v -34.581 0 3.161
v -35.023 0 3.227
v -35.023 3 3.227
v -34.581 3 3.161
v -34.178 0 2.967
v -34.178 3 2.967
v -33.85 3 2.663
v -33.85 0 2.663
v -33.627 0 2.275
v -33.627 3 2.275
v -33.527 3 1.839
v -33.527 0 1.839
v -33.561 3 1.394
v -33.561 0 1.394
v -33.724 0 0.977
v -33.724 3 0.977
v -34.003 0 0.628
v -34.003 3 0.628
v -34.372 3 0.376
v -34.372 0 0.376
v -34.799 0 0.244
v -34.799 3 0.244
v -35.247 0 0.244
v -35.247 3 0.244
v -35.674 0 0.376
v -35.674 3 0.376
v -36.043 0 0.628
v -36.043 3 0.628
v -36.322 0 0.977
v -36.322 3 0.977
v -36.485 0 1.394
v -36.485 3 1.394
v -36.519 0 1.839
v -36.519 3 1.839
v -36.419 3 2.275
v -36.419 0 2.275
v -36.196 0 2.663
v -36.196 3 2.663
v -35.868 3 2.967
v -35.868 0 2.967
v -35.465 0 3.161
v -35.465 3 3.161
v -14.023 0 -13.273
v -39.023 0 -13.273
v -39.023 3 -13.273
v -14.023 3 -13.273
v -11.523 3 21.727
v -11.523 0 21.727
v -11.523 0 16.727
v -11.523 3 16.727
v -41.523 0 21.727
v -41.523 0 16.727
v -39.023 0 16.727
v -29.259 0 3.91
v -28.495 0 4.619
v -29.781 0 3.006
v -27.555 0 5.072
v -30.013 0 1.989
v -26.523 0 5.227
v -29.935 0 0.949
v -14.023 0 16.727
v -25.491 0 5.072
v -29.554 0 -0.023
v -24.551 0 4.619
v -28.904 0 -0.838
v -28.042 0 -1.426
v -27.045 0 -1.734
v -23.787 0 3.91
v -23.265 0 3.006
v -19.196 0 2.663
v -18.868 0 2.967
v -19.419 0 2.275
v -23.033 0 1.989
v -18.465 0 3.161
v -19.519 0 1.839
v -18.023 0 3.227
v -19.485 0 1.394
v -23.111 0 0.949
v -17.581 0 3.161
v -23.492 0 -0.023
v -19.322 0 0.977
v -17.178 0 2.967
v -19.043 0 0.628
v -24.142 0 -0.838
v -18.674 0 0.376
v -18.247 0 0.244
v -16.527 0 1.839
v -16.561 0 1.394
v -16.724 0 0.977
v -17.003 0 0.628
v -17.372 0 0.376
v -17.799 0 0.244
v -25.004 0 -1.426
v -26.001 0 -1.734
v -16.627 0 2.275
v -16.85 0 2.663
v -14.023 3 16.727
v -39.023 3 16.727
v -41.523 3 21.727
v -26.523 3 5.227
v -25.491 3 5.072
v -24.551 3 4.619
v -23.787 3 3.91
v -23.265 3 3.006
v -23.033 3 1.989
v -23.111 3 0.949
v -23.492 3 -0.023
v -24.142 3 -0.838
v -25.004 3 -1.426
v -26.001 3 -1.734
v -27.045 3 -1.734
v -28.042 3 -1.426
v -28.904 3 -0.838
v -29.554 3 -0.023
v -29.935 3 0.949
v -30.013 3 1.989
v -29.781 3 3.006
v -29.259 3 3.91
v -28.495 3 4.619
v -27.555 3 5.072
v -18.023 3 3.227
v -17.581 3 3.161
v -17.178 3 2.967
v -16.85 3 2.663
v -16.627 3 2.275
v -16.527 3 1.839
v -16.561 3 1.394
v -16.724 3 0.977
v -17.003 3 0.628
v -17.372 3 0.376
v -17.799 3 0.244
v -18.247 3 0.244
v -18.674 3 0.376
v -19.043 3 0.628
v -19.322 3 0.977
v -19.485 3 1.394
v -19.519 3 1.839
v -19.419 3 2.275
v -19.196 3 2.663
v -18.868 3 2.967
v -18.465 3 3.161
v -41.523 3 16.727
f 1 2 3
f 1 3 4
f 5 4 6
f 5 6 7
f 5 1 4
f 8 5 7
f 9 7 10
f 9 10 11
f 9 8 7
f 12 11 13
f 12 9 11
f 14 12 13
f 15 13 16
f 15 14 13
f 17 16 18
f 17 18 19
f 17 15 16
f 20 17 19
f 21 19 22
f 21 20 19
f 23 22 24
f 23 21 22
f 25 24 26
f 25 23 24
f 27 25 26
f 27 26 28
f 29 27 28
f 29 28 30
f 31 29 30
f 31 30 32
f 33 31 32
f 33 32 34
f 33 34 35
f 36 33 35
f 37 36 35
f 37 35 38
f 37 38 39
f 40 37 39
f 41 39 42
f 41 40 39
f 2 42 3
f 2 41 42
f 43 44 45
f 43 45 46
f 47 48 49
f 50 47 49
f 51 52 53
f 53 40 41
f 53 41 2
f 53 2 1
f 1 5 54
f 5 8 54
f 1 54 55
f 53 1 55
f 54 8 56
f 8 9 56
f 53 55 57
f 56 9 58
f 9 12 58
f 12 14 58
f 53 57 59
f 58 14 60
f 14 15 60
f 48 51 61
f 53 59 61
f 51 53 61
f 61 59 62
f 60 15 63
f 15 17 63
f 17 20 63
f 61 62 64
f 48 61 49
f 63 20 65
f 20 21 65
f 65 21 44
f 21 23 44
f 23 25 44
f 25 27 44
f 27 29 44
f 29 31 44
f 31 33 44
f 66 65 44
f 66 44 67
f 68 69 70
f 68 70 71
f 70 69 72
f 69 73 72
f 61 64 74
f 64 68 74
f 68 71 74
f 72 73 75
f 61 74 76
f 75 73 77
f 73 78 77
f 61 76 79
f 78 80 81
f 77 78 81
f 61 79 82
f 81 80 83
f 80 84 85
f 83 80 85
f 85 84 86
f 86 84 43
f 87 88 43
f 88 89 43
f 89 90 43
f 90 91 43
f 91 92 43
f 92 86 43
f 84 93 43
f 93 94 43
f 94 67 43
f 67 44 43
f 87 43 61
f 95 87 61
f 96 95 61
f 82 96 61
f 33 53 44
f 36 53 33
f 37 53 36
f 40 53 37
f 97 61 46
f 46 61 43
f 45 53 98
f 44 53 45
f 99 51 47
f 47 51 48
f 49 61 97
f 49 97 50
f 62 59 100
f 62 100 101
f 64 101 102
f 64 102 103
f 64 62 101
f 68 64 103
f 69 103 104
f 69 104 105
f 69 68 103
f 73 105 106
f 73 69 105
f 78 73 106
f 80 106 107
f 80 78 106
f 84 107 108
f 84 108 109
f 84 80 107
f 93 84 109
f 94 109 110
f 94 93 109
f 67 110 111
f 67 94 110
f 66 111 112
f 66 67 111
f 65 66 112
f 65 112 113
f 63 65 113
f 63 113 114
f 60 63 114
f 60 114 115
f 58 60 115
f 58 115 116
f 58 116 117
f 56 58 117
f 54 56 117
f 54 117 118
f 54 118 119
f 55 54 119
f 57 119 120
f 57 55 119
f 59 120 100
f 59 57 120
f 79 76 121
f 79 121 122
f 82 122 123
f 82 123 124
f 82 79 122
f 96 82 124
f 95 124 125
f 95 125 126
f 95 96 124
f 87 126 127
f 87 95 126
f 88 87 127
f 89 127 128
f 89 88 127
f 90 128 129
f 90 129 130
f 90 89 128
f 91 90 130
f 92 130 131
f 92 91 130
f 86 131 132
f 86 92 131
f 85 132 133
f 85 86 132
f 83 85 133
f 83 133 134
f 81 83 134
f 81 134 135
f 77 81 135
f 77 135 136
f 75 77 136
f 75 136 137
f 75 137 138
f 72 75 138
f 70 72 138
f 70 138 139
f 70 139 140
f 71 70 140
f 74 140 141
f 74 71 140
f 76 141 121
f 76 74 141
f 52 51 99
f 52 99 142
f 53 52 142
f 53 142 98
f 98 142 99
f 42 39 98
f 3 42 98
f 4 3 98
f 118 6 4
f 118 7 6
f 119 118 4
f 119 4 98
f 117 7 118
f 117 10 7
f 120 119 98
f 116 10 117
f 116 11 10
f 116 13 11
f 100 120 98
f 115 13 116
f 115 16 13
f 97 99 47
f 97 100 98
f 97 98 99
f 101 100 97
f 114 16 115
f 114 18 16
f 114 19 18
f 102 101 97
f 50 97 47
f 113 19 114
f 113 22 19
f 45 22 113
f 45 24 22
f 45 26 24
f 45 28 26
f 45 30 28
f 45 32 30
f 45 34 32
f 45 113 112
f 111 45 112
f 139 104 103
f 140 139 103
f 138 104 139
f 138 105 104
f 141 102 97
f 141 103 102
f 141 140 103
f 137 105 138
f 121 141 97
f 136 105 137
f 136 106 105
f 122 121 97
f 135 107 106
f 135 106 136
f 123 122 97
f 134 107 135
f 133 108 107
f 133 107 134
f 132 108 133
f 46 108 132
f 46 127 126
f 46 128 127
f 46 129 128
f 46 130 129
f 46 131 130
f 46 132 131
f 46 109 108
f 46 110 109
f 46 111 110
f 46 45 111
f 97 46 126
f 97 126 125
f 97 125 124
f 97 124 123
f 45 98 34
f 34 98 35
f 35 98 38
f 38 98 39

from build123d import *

# Parameters (mm, degrees)
SKETCH1_W           = 25
SKETCH1_H           = 30
SKETCH1_R           = 1.5
SKETCH1_R_2         = 3.5
SKETCH1_W_2         = 30
SKETCH1_H_2         = 5
BOSS_EXTRUDE4_DEPTH = 3


with BuildPart() as part:
    # Sketch1 → Boss-Extrude4 (new body)
    # profile 1 of 2: a face of its own
    with BuildSketch(Plane(origin=(0, 0, 0), x_dir=(1, 0, 0), z_dir=(0, 1, 0))):
        with Locations((-26.523048167, -1.727371577)):
            Rectangle(SKETCH1_W, SKETCH1_H)
        with Locations(Location((-18.023048167, -1.727371577, 0), (0, 0, 270))):
            Circle(SKETCH1_R, mode=Mode.SUBTRACT)
        with Locations(Location((-26.523048167, -1.727371577, 0), (0, 0, 270))):
            Circle(SKETCH1_R_2, mode=Mode.SUBTRACT)
        with Locations(Location((-35.023048167, -1.727371577, 0), (0, 0, 270))):
            Circle(SKETCH1_R, mode=Mode.SUBTRACT)
    # profile 2 of 2: a face of its own
    with BuildSketch(Plane(origin=(0, 0, 0), x_dir=(1, 0, 0), z_dir=(0, 1, 0))):
        with Locations((-26.523048167, -19.227371577)):
            Rectangle(SKETCH1_W_2, SKETCH1_H_2)
    extrude(amount=BOSS_EXTRUDE4_DEPTH)


solid = part.part
